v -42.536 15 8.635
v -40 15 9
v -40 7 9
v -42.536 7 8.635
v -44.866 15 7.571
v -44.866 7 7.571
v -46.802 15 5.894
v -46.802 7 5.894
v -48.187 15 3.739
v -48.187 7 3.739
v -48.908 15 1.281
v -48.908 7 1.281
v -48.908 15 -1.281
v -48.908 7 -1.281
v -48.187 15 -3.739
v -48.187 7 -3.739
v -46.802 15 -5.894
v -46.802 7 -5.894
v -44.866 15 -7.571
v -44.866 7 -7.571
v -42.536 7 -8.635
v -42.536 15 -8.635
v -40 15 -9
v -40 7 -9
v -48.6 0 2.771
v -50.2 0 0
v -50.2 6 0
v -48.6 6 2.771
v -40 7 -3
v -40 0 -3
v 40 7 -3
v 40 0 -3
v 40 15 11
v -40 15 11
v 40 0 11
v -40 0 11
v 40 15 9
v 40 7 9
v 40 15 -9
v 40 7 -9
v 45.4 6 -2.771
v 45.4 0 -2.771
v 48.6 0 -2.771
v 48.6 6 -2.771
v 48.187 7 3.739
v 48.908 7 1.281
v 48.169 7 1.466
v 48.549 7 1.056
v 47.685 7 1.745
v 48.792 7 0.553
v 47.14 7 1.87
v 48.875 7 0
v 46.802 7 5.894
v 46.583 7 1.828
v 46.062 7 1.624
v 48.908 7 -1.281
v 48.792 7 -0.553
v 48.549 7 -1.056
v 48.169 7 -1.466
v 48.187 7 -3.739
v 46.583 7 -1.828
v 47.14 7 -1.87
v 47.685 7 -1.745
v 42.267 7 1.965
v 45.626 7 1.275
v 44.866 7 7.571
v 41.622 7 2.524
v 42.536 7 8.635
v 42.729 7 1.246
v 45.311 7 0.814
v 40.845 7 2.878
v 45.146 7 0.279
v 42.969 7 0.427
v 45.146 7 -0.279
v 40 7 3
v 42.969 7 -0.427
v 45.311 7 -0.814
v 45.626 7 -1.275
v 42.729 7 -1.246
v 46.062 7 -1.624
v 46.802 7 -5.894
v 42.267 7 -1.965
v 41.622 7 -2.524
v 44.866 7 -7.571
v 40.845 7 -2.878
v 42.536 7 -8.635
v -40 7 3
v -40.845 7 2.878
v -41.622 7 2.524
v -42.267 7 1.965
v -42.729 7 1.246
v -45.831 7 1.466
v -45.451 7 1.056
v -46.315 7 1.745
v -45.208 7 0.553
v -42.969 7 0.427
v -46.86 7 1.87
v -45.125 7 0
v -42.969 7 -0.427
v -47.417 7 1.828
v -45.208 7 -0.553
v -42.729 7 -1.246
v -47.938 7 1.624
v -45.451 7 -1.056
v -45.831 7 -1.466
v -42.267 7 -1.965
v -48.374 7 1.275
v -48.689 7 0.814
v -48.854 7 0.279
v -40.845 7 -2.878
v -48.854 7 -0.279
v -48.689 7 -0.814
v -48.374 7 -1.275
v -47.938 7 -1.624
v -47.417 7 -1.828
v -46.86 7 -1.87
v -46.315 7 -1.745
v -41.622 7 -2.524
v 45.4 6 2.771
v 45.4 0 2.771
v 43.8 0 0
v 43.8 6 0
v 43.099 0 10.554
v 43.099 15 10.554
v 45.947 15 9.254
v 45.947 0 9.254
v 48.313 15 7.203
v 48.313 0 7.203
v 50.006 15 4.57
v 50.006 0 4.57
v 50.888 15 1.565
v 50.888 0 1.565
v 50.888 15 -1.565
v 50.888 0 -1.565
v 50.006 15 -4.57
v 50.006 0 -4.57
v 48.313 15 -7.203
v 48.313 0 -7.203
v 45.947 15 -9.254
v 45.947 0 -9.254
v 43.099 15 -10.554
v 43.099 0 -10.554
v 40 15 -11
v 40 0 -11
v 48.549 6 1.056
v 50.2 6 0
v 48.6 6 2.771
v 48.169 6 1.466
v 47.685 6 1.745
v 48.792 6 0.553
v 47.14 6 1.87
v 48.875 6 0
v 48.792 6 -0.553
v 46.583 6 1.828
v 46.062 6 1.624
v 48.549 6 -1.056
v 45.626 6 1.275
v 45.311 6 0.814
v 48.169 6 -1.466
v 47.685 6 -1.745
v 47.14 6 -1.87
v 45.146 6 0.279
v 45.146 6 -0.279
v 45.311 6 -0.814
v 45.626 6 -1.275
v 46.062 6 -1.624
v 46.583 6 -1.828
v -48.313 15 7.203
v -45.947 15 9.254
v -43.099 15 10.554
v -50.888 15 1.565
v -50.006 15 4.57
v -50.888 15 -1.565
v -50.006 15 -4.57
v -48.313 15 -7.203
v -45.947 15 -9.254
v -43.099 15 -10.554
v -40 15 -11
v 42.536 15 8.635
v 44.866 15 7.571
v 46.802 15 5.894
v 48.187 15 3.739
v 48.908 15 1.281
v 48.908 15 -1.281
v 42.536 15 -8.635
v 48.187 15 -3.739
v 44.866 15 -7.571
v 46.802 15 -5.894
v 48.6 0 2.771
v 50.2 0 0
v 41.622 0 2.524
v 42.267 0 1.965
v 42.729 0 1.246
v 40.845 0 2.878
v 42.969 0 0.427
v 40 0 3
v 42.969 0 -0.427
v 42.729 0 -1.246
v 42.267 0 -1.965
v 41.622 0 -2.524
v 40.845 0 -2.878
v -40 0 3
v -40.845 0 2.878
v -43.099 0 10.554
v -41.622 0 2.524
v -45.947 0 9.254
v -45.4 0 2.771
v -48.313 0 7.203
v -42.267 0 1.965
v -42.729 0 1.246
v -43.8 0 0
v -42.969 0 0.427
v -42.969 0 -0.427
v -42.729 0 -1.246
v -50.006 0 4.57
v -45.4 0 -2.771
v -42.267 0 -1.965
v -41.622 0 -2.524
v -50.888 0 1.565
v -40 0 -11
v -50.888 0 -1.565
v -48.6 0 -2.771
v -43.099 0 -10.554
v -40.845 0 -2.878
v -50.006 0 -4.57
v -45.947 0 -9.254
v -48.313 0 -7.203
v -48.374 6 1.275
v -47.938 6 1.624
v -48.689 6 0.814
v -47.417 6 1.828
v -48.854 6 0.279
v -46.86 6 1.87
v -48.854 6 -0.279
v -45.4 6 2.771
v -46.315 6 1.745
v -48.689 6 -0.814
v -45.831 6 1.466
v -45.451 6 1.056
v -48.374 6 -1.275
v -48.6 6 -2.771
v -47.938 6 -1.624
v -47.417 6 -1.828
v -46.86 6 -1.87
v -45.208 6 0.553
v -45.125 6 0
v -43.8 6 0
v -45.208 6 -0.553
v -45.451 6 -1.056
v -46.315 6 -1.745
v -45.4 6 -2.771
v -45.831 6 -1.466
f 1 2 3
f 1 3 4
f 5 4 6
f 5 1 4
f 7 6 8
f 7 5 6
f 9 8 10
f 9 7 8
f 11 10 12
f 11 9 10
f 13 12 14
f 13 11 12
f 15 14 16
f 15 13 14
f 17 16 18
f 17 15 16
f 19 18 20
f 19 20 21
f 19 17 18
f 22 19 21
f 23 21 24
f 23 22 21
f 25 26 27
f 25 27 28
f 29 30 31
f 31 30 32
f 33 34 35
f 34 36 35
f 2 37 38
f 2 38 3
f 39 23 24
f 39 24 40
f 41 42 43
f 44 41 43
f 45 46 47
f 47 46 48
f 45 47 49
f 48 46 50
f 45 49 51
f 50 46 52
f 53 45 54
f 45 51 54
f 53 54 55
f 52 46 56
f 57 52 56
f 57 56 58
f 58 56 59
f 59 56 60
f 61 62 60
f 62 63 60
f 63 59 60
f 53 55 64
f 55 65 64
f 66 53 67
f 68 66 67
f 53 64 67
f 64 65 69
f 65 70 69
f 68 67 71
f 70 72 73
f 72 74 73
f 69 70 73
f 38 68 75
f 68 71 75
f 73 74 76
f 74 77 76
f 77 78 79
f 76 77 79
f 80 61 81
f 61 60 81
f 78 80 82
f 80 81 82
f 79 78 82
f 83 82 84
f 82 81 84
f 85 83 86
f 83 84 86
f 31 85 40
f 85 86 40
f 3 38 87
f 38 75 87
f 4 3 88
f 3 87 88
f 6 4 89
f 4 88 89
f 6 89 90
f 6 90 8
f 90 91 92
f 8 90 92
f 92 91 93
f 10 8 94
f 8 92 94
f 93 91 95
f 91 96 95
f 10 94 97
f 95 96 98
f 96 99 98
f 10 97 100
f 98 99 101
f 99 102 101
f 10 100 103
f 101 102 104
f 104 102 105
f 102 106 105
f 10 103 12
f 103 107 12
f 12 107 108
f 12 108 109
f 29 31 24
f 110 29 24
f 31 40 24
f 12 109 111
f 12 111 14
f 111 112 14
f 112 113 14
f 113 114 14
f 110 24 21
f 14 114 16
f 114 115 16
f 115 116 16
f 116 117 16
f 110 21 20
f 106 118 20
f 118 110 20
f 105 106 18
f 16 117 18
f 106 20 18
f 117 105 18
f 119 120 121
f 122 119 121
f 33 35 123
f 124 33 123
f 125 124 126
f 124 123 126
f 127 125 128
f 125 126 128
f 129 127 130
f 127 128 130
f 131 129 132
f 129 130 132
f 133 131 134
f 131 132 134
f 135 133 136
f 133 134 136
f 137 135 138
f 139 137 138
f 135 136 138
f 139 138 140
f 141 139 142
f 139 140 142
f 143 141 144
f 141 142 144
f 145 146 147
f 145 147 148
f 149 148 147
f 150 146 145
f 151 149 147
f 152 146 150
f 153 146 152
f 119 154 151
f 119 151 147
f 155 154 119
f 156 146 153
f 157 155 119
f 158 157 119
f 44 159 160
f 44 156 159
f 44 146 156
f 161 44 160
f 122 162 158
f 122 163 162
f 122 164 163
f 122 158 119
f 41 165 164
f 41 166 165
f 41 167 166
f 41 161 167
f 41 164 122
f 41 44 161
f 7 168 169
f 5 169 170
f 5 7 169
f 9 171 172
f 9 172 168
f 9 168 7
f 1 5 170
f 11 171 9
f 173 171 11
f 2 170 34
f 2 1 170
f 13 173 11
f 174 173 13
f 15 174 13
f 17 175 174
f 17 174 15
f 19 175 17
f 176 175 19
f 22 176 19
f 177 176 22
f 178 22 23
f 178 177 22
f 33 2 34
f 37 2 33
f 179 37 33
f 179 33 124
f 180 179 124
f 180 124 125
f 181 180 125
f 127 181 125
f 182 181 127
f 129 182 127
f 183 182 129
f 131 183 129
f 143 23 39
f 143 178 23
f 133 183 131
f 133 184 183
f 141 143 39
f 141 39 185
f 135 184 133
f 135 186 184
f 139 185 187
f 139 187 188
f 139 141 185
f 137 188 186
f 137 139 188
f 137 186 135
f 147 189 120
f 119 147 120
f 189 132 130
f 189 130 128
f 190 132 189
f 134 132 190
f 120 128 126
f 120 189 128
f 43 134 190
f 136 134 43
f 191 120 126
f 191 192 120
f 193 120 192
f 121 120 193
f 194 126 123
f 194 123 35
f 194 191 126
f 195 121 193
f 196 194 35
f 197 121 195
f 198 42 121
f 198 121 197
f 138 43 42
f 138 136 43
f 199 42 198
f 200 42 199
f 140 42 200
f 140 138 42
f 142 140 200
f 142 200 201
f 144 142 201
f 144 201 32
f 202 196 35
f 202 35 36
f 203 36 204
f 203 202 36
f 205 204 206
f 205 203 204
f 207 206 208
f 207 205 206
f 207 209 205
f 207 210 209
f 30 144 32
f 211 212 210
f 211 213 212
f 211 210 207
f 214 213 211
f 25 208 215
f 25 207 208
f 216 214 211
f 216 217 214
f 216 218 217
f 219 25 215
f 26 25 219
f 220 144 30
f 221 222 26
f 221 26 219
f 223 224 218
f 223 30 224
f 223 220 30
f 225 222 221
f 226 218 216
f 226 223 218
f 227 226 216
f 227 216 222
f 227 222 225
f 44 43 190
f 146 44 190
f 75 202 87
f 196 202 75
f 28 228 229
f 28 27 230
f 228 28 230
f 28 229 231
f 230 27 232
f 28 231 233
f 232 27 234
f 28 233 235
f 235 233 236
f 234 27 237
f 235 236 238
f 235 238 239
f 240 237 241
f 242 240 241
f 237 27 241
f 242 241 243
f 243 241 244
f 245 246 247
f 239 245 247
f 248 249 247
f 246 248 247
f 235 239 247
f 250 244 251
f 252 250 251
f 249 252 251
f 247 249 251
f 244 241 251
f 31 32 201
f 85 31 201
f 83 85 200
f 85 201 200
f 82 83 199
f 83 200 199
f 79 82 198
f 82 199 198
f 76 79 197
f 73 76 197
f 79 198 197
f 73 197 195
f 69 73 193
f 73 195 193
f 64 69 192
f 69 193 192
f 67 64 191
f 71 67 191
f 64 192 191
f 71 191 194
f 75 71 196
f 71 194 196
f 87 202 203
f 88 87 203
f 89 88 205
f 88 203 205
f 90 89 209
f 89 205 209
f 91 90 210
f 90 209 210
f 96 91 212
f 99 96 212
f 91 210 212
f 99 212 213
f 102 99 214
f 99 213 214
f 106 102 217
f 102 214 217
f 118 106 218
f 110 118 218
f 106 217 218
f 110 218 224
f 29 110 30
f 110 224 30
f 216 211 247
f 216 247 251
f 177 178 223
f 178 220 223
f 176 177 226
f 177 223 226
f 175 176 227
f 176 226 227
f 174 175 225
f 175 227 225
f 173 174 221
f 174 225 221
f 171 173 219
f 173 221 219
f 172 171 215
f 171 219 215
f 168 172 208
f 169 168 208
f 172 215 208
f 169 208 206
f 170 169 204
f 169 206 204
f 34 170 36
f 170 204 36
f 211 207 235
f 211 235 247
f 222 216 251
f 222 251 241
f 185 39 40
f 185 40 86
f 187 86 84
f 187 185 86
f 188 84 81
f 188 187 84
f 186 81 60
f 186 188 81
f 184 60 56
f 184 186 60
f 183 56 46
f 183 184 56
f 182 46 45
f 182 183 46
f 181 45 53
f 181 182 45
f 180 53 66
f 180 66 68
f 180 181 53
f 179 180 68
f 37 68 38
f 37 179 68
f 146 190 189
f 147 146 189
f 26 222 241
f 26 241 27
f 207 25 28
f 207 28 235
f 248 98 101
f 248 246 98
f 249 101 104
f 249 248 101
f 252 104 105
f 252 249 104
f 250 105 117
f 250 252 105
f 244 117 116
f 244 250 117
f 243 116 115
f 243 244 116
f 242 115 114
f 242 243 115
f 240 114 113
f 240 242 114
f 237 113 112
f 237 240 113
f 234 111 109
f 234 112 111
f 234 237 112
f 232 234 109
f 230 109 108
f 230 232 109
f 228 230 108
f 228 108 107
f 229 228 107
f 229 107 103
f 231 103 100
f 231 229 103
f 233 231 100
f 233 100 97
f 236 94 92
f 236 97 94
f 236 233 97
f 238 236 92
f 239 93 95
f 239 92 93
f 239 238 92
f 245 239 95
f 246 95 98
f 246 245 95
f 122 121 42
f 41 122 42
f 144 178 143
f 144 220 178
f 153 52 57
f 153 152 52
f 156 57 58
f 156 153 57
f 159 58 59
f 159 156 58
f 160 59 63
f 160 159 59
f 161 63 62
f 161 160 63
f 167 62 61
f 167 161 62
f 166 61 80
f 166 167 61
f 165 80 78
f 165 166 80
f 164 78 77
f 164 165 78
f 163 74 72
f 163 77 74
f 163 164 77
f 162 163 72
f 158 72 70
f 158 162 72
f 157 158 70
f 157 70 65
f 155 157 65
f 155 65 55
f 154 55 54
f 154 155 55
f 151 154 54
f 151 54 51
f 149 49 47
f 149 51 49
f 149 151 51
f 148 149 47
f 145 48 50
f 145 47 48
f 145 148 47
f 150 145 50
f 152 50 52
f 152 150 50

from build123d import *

# Parameters (mm, degrees)
SALIENTE_EXTRUIR1_DEPTH    = 12
CORTAR_EXTRUIR1_DEPTH      = 6
CROQUIS5_R                 = 1.875
CORTAR_EXTRUIR2_DEPTH      = 7
CORTAR_EXTRUIR2_DEPTH_BACK = 7
CROQUIS6_W                 = 80
CROQUIS6_H                 = 8
CROQUIS6_R                 = 1.875
SALIENTE_EXTRUIR4_DEPTH    = 3
CORTAR_EXTRUIR3_DEPTH      = 8


with BuildPart() as part:
    # Croquis1 → Saliente-Extruir1 (new body)
    with BuildSketch(Plane(origin=(0, 0, 0), x_dir=(1, 0, 0), z_dir=(0, 1, 0))):
        with BuildLine():
            Line((-40, 11), (40, 11))
            ThreePointArc((40, 11), (51, 0), (40, -11))
            Line((40, -11), (-40, -11))
            ThreePointArc((-40, -11), (-51, 0), (-40, 11))
        make_face()
        with BuildLine():
            Line((-40, 3), (40, 3))
            ThreePointArc((40, 3), (43, 0), (40, -3))
            Line((40, -3), (-40, -3))
            ThreePointArc((-40, -3), (-43, 0), (-40, 3))
        make_face(mode=Mode.SUBTRACT)
    extrude(amount=SALIENTE_EXTRUIR1_DEPTH)

    # Croquis2 → Cortar-Extruir1 (cut)
    with BuildSketch(Plane(origin=(0, 0, 0), x_dir=(1, 0, 0), z_dir=(0, 1, 0))):
        Polygon((45.4, -2.771281292), (43.8, 0), (45.4, 2.771281292), (48.6, 2.771281292), (50.2, 0), (48.6, -2.771281292), align=None)
        Polygon((-45.4, 2.771281292), (-48.6, 2.771281292), (-50.2, 0), (-48.6, -2.771281292), (-45.4, -2.771281292), (-43.8, 0), align=None)
    extrude(amount=CORTAR_EXTRUIR1_DEPTH, mode=Mode.SUBTRACT)

    # Croquis5 → Cortar-Extruir2 (cut, two sides)
    with BuildSketch(Plane.XZ.offset(-6)) as cortar_extruir2_sk:
        with Locations((-47, 0)):
            Circle(CROQUIS5_R)
        with Locations((47, 0)):
            Circle(CROQUIS5_R)
    extrude(amount=CORTAR_EXTRUIR2_DEPTH, mode=Mode.SUBTRACT)
    extrude(cortar_extruir2_sk.sketch, amount=-CORTAR_EXTRUIR2_DEPTH_BACK, mode=Mode.SUBTRACT)

    # Croquis6 → Saliente-Extruir4 (add)
    with BuildSketch(Plane(origin=(0, 12, 0), x_dir=(1, 0, 0), z_dir=(0, 1, 0))):
        with Locations((0, 7)):
            Rectangle(CROQUIS6_W, CROQUIS6_H)
        with Locations((0, -7)):
            Rectangle(CROQUIS6_W, CROQUIS6_H)
        with BuildLine():
            Line((-40, 3), (-40, 11))
            ThreePointArc((-40, 11), (-51, 0), (-40, -11))
            Line((-40, -11), (-40, -3))
            ThreePointArc((-40, -3), (-43, 0), (-40, 3))
        make_face()
        with Locations((-47, 0)):
            Circle(CROQUIS6_R, mode=Mode.SUBTRACT)
        with BuildLine():
            ThreePointArc((40, -11), (51, 0), (40, 11))
            Line((40, 11), (40, 3))
            ThreePointArc((40, 3), (43, 0), (40, -3))
            Line((40, -3), (40, -11))
        make_face()
        with Locations((47, 0)):
            Circle(CROQUIS6_R, mode=Mode.SUBTRACT)
    extrude(amount=SALIENTE_EXTRUIR4_DEPTH)

    # Croquis7 → Cortar-Extruir3 (cut)
    with BuildSketch(Plane(origin=(0, 15, 0), x_dir=(1, 0, 0), z_dir=(0, 1, 0))):
        with BuildLine():
            Line((-40, 9), (40, 9))
            ThreePointArc((40, 9), (49, 0), (40, -9))
            Line((40, -9), (-40, -9))
            ThreePointArc((-40, -9), (-49, 0), (-40, 9))
        make_face()
    extrude(amount=-CORTAR_EXTRUIR3_DEPTH, mode=Mode.SUBTRACT)


solid = part.part
